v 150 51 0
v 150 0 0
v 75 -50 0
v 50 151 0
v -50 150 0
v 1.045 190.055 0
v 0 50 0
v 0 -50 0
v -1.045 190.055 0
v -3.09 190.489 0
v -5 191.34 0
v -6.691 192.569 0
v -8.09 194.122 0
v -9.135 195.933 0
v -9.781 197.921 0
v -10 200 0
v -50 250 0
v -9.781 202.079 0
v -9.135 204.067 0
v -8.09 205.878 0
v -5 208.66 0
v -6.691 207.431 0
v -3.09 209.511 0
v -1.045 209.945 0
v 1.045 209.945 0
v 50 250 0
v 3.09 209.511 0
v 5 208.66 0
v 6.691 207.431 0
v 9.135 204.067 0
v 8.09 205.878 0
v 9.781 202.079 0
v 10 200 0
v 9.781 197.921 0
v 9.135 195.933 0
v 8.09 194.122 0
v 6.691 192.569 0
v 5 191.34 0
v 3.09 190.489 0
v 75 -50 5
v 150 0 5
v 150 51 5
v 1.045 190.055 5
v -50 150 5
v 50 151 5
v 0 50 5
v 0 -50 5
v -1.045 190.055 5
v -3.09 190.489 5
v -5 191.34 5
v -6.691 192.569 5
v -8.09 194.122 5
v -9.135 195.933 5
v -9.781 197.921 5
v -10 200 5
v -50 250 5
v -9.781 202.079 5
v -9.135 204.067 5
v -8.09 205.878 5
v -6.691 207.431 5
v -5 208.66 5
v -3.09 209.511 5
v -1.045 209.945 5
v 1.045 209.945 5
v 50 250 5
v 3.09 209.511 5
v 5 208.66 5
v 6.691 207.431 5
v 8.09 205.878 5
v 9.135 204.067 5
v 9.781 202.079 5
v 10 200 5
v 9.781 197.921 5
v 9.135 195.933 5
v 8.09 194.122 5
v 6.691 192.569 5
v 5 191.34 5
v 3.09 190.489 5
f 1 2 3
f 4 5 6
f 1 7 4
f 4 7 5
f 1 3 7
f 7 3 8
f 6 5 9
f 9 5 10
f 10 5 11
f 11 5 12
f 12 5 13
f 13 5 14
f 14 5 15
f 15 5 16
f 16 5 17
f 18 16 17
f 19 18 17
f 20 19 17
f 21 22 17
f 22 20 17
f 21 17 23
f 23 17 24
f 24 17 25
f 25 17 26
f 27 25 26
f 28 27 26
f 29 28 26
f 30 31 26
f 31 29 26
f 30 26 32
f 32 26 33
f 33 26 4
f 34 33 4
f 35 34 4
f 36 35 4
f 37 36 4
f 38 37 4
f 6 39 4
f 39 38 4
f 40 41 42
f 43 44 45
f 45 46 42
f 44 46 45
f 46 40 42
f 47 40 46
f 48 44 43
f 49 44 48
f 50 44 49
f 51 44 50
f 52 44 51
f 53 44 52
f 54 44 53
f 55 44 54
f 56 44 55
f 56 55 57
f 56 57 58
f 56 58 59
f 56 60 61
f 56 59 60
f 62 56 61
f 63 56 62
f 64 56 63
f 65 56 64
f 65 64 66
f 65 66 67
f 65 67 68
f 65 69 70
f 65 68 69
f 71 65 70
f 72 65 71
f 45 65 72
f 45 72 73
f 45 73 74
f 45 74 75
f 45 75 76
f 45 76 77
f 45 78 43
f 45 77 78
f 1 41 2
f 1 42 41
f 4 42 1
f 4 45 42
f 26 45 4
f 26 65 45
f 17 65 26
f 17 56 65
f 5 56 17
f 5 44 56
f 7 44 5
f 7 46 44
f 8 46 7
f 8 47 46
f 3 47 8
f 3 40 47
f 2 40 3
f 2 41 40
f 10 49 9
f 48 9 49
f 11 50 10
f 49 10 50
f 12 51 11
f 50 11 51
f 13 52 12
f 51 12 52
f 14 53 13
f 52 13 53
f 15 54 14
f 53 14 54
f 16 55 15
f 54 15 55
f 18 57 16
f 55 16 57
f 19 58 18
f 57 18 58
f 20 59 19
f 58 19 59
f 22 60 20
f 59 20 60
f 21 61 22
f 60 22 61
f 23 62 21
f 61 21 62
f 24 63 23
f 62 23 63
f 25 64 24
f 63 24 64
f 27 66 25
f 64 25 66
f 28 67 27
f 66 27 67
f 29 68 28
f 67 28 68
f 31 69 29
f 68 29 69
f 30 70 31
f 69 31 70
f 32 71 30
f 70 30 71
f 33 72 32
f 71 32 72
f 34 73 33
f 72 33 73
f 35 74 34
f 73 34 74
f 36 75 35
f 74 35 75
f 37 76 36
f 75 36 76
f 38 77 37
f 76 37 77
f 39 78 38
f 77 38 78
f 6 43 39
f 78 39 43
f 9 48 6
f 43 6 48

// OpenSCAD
//Sideplate for the Gantry.

module gantrySide(height=250, topwidth=100, topheight=100, bottomwidth=80, bottomheight=50, topoffset=-100, railDiameter=10, width=5) {
	linear_extrude(width) 
	difference() {
		union() {
			hull() {
				translate([0,-50,0]) square([bottomwidth/2, 20]);
				square([bottomwidth, bottomheight]);
			}
			translate([topoffset, height-topheight, 0]) square([topwidth, topheight]);
			hull() {
				translate([0, bottomheight,0]) square([bottomwidth, 1]);
				translate([topoffset, height-topheight,0]) square([topwidth, 1]);
			}
		}
		translate([topoffset+topwidth/2, height-topheight/2, 0]) circle(railDiameter);
	}
}

//gantrySide();
gantry_topoffset = -50;
gantry_bottomwidth = 150;
cnc_height = 250;
gantrySide(height=cnc_height, topoffset=gantry_topoffset, bottomwidth=gantry_bottomwidth, bottomheight=50);
